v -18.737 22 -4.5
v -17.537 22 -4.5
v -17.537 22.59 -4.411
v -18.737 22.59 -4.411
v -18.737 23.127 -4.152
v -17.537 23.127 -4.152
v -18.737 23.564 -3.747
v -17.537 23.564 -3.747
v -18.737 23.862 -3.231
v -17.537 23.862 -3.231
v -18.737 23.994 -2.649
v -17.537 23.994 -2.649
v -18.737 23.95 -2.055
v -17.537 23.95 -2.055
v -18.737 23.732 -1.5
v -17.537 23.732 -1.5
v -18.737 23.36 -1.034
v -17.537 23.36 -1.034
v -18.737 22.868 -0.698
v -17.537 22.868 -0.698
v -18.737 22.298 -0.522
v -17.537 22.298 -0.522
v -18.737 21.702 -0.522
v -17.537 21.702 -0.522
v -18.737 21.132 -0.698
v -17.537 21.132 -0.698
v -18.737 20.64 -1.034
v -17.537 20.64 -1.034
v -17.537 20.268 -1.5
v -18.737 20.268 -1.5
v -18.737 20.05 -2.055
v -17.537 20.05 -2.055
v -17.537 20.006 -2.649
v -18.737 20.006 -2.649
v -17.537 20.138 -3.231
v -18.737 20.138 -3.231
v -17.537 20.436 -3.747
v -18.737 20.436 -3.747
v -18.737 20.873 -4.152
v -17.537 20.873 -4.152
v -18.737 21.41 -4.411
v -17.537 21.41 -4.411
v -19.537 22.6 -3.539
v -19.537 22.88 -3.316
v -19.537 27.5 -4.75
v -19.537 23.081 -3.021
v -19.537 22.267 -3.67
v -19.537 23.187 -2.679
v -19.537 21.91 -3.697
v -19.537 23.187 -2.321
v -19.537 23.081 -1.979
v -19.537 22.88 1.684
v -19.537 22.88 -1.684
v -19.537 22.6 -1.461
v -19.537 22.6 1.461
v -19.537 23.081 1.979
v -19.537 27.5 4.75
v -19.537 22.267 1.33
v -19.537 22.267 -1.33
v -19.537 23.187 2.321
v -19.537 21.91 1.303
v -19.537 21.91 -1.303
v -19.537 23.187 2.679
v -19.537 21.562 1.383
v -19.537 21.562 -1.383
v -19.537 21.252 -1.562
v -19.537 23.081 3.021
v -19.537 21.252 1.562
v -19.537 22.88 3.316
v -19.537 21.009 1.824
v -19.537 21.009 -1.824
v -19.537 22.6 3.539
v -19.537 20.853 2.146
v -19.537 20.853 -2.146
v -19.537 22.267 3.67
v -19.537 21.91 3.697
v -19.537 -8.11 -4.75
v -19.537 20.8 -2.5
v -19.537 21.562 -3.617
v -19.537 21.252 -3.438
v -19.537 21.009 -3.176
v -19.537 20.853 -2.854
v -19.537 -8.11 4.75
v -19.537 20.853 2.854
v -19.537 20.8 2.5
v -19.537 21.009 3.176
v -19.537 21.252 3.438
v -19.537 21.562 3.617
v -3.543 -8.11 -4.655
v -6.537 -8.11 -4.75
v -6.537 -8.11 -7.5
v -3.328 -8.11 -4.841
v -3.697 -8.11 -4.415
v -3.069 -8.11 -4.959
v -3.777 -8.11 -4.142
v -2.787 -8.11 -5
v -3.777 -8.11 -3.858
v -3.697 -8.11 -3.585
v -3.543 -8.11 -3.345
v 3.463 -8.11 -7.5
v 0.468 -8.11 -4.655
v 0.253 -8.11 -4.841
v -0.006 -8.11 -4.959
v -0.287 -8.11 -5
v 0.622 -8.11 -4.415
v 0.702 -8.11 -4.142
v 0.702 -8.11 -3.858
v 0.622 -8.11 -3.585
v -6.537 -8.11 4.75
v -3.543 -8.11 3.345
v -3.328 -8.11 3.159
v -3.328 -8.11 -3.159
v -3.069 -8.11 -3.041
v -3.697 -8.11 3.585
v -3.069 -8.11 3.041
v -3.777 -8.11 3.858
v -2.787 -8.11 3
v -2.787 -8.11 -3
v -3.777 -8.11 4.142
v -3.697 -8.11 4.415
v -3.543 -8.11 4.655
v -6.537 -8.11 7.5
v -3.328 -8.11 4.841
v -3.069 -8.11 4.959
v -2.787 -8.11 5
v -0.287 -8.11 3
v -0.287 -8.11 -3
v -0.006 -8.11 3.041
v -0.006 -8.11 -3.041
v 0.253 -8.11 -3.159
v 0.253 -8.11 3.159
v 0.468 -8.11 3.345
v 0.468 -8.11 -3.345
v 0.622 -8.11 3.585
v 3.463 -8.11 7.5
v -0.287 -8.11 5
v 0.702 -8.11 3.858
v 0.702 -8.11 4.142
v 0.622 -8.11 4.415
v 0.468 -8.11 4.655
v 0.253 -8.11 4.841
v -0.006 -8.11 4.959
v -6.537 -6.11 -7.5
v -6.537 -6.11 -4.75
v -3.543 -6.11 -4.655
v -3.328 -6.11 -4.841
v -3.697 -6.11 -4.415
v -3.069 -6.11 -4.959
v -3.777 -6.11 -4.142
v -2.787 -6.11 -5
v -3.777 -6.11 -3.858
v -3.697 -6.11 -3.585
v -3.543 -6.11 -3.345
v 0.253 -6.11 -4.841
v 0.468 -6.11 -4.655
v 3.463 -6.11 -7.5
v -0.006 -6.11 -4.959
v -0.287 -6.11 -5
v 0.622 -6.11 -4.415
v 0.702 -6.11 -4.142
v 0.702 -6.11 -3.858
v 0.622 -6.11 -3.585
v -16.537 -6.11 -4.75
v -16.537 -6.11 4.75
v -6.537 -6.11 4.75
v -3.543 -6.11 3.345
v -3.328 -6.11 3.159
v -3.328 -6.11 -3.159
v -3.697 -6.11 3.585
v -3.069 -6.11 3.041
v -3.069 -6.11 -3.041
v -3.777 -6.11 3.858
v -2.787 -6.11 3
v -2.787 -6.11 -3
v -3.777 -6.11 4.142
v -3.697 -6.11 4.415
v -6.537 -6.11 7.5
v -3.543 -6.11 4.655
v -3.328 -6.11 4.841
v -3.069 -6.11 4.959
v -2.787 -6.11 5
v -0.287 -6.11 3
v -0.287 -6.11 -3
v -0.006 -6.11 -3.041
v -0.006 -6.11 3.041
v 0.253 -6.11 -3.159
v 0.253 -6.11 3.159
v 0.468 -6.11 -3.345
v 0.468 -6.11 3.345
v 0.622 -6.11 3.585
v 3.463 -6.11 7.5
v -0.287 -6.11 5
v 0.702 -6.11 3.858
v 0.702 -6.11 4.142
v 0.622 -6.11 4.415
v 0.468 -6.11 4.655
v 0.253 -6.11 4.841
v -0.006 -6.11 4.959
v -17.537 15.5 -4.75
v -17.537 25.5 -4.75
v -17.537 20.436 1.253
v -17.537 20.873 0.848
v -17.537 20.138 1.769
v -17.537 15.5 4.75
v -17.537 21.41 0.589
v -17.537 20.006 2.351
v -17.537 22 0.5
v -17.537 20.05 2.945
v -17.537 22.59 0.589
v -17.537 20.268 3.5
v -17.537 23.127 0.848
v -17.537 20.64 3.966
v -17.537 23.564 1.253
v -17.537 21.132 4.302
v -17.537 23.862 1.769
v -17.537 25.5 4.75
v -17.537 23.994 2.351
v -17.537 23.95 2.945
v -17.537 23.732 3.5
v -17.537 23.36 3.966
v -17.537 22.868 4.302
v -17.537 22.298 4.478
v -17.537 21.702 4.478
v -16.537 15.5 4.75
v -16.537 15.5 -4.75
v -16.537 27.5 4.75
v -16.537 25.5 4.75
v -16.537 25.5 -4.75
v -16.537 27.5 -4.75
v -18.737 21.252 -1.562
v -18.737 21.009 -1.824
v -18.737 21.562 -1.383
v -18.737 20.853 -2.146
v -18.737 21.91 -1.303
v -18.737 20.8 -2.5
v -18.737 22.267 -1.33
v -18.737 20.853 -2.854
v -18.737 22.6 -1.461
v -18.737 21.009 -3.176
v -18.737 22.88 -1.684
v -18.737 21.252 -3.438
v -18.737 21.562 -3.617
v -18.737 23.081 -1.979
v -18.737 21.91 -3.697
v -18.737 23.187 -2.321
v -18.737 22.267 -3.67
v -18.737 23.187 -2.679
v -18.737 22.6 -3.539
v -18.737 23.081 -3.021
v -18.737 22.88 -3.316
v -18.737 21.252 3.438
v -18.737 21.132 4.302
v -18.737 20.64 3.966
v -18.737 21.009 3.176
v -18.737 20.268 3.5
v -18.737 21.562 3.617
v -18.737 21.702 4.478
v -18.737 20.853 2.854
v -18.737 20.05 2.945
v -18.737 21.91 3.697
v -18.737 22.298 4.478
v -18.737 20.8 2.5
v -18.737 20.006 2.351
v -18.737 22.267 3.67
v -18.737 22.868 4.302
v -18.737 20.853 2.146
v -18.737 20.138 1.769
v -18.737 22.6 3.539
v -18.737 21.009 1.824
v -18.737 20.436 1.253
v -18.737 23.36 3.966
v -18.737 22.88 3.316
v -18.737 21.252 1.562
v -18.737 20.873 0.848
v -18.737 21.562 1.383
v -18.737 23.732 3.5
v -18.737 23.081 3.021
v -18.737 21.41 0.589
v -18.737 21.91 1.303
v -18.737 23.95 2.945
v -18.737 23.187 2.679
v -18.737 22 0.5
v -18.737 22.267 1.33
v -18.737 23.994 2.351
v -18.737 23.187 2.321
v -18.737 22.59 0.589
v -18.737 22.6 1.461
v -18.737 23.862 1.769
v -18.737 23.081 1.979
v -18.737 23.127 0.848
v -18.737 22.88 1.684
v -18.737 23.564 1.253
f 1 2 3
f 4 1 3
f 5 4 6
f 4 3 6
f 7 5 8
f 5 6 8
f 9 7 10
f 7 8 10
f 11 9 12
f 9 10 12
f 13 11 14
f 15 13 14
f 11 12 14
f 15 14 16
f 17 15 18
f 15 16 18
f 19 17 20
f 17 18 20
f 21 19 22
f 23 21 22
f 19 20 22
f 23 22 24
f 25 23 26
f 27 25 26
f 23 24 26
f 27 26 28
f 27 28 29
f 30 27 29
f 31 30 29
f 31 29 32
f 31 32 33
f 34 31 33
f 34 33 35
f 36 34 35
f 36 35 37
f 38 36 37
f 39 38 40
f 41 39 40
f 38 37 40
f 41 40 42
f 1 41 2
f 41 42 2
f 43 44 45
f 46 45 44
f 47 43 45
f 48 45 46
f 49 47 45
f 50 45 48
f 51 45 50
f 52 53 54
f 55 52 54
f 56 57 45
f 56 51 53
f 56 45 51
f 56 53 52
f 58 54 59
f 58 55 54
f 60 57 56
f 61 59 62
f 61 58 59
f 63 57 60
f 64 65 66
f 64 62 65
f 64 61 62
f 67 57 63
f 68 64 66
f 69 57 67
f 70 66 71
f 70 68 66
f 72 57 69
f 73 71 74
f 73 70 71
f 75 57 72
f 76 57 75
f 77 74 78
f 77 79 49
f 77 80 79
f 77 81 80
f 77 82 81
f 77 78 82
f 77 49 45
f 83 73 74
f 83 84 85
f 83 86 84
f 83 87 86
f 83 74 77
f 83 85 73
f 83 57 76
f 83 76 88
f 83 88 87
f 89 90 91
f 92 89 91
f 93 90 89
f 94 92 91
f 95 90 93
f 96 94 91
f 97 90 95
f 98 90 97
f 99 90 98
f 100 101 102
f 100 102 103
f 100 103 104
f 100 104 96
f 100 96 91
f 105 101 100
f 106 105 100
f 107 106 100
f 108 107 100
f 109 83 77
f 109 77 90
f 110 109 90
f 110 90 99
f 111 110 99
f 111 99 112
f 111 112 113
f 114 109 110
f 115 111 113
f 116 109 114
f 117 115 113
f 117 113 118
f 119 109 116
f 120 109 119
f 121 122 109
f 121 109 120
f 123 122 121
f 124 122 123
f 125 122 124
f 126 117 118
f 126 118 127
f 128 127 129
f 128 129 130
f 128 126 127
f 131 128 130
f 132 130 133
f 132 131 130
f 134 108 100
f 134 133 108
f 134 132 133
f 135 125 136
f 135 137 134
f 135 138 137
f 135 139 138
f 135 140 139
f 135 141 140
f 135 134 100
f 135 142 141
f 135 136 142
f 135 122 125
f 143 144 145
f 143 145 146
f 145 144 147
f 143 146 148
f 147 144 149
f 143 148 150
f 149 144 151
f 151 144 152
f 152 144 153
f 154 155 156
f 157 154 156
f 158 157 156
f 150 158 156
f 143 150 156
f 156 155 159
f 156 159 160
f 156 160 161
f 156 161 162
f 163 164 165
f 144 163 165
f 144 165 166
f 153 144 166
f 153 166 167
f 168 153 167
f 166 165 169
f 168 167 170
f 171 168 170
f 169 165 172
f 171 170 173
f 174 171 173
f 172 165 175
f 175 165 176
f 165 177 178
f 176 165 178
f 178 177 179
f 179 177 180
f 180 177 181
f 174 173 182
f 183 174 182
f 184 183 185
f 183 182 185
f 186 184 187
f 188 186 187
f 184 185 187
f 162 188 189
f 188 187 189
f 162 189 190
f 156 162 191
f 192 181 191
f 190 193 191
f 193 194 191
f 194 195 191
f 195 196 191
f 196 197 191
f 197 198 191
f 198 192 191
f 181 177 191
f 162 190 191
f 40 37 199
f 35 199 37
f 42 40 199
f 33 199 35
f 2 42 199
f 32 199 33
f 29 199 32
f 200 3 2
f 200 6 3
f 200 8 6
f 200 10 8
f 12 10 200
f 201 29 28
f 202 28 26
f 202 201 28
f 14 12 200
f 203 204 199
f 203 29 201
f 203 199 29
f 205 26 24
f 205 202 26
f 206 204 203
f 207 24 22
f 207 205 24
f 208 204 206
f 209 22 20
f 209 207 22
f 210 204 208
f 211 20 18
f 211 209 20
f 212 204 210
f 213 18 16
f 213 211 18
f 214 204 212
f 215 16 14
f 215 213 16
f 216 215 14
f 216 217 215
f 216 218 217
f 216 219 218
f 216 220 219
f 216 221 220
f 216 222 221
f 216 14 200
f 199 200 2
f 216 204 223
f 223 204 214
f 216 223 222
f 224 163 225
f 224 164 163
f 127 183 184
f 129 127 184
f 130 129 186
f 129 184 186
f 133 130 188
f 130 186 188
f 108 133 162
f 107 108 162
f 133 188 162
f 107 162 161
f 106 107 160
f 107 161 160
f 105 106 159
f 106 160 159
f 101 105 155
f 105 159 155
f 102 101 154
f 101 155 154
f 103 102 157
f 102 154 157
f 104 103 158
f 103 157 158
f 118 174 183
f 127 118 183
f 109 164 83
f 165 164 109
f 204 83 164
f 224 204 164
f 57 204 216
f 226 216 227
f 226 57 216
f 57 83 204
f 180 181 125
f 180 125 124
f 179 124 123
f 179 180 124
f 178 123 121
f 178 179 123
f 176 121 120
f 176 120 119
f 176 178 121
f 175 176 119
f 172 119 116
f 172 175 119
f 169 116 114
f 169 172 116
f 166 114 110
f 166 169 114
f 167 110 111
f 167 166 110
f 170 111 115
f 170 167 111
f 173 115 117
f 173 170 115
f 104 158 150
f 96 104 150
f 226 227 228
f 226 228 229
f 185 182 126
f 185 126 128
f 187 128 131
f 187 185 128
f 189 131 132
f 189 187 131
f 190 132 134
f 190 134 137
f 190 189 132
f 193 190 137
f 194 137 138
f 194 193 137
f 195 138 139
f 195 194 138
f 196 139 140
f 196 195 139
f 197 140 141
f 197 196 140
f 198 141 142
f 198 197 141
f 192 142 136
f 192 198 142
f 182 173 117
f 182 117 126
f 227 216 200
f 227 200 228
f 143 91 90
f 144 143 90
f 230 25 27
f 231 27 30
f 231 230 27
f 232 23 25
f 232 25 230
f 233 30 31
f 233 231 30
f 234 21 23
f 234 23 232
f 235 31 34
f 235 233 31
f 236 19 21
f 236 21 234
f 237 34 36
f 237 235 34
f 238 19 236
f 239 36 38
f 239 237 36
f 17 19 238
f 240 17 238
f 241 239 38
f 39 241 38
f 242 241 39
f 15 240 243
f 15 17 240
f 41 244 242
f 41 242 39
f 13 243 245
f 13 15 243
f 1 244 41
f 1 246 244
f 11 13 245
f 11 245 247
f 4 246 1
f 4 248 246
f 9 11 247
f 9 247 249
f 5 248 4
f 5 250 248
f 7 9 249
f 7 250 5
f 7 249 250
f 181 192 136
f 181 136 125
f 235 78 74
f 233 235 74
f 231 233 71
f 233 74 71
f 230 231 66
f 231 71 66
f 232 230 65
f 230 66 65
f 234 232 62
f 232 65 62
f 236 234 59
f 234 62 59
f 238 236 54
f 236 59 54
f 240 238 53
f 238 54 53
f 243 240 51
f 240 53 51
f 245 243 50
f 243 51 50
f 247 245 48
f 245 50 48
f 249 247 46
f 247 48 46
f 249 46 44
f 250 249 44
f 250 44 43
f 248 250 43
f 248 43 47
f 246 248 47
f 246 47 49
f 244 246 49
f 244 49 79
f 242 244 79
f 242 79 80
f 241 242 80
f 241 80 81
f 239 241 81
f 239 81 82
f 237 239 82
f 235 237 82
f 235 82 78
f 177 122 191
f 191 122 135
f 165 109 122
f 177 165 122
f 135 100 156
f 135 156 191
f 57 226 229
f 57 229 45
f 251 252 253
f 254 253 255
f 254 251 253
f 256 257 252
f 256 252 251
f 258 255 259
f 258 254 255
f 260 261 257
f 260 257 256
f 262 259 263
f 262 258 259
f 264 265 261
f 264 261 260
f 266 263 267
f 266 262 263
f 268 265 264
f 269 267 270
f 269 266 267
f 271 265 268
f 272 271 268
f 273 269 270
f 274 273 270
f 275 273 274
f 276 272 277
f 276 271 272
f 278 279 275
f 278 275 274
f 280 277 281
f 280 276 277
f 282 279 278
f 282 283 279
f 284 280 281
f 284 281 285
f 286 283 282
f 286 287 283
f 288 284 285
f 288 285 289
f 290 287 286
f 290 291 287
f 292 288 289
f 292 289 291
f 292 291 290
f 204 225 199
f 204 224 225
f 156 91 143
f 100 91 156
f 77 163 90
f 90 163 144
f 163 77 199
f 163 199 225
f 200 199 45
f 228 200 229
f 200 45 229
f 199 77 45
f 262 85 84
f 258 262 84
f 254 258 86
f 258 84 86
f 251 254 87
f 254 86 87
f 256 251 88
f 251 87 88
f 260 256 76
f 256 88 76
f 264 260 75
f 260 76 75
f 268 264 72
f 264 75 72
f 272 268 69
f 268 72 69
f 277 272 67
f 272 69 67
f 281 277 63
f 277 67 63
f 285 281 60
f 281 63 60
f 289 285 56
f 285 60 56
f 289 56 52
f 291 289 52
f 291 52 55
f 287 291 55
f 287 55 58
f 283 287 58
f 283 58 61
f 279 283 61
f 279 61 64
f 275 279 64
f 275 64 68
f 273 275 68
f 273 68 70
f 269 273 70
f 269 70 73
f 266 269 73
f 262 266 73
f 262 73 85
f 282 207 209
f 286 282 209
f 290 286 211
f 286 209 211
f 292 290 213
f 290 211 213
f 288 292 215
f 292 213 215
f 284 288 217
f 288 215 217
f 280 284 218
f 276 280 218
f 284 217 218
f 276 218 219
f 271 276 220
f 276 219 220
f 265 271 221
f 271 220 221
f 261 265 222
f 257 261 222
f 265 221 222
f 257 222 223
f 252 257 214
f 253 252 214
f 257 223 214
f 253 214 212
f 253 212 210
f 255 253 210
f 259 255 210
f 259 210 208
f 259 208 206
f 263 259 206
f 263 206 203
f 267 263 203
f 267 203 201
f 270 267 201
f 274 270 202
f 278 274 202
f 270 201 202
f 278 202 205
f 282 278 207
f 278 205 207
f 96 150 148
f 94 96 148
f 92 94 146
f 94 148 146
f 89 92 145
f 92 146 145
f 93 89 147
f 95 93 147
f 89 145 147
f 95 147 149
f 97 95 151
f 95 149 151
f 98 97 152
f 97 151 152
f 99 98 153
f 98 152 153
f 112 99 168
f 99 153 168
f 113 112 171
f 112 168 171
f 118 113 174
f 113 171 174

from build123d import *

# Parameters (mm, degrees)
BOSS_EXTRUDE1_DEPTH  = 4.75
M2_CLEARANCE_HOLE1_D = 2.4
SKETCH4_R            = 2
CUT_EXTRUDE1_DEPTH   = 1.2
SKETCH5_W            = 10
SKETCH5_H            = 15
BOSS_EXTRUDE2_DEPTH  = 2
CUT_EXTRUDE2_DEPTH   = 2


with BuildPart() as part:
    # Sketch1 → Boss-Extrude1 (new, symmetric)
    with BuildSketch(Plane.XY):
        Polygon((-17.53737418, 15.5), (-17.53737418, 25.5), (-16.53737418, 25.5), (-16.53737418, 27.5), (-19.53737418, 27.5), (-19.53737418, 0), (-19.53737418, -8.11), (-11.42737418, -8.11), (3.46262582, -8.11), (3.46262582, -6.11), (-12.42737418, -6.11), (-16.53737418, -6.11), (-16.53737418, 12.5), (-16.53737418, 15.5), align=None)
    extrude(amount=BOSS_EXTRUDE1_DEPTH, both=True)

    # M2 Clearance Hole1 (through all)
    with Locations(Plane(origin=(-17.53737418, 22, 2.5), x_dir=(0, 1, 0), z_dir=(1, 0, 0))):
        with Locations((0, 0), (0, -5)):
            Hole(M2_CLEARANCE_HOLE1_D / 2)

    # Sketch4 → Cut-Extrude1 (cut)
    with BuildSketch(Plane(origin=(-17.53737418, 0, 0), x_dir=(0, 0, -1), z_dir=(1, 0, 0))):
        with Locations((-2.5, 22)):
            Circle(SKETCH4_R)
        with Locations((2.5, 22)):
            Circle(SKETCH4_R)
    extrude(amount=-CUT_EXTRUDE1_DEPTH, mode=Mode.SUBTRACT)

    # Sketch5 → Boss-Extrude2 (add)
    with BuildSketch(Plane.XZ.offset(8.11)):
        with Locations((-1.53737418, 0)):
            Rectangle(SKETCH5_W, SKETCH5_H)
    extrude(amount=-BOSS_EXTRUDE2_DEPTH)

    # Sketch6 → Cut-Extrude2 (cut)
    with BuildSketch(Plane(origin=(0, -6.11, 0), x_dir=(1, 0, 0), z_dir=(0, 1, 0))):
        with BuildLine():
            Line((-0.28737418, -5), (-2.78737418, -5))
            ThreePointArc((-2.78737418, -5), (-3.78737418, -4), (-2.78737418, -3))
            Line((-2.78737418, -3), (-0.28737418, -3))
            ThreePointArc((-0.28737418, -3), (0.71262582, -4), (-0.28737418, -5))
        make_face()
        with BuildLine():
            Line((-0.28737418, 5), (-2.78737418, 5))
            ThreePointArc((-2.78737418, 5), (-3.78737418, 4), (-2.78737418, 3))
            Line((-2.78737418, 3), (-0.28737418, 3))
            ThreePointArc((-0.28737418, 3), (0.71262582, 4), (-0.28737418, 5))
        make_face()
    extrude(amount=-CUT_EXTRUDE2_DEPTH, mode=Mode.SUBTRACT)


solid = part.part
